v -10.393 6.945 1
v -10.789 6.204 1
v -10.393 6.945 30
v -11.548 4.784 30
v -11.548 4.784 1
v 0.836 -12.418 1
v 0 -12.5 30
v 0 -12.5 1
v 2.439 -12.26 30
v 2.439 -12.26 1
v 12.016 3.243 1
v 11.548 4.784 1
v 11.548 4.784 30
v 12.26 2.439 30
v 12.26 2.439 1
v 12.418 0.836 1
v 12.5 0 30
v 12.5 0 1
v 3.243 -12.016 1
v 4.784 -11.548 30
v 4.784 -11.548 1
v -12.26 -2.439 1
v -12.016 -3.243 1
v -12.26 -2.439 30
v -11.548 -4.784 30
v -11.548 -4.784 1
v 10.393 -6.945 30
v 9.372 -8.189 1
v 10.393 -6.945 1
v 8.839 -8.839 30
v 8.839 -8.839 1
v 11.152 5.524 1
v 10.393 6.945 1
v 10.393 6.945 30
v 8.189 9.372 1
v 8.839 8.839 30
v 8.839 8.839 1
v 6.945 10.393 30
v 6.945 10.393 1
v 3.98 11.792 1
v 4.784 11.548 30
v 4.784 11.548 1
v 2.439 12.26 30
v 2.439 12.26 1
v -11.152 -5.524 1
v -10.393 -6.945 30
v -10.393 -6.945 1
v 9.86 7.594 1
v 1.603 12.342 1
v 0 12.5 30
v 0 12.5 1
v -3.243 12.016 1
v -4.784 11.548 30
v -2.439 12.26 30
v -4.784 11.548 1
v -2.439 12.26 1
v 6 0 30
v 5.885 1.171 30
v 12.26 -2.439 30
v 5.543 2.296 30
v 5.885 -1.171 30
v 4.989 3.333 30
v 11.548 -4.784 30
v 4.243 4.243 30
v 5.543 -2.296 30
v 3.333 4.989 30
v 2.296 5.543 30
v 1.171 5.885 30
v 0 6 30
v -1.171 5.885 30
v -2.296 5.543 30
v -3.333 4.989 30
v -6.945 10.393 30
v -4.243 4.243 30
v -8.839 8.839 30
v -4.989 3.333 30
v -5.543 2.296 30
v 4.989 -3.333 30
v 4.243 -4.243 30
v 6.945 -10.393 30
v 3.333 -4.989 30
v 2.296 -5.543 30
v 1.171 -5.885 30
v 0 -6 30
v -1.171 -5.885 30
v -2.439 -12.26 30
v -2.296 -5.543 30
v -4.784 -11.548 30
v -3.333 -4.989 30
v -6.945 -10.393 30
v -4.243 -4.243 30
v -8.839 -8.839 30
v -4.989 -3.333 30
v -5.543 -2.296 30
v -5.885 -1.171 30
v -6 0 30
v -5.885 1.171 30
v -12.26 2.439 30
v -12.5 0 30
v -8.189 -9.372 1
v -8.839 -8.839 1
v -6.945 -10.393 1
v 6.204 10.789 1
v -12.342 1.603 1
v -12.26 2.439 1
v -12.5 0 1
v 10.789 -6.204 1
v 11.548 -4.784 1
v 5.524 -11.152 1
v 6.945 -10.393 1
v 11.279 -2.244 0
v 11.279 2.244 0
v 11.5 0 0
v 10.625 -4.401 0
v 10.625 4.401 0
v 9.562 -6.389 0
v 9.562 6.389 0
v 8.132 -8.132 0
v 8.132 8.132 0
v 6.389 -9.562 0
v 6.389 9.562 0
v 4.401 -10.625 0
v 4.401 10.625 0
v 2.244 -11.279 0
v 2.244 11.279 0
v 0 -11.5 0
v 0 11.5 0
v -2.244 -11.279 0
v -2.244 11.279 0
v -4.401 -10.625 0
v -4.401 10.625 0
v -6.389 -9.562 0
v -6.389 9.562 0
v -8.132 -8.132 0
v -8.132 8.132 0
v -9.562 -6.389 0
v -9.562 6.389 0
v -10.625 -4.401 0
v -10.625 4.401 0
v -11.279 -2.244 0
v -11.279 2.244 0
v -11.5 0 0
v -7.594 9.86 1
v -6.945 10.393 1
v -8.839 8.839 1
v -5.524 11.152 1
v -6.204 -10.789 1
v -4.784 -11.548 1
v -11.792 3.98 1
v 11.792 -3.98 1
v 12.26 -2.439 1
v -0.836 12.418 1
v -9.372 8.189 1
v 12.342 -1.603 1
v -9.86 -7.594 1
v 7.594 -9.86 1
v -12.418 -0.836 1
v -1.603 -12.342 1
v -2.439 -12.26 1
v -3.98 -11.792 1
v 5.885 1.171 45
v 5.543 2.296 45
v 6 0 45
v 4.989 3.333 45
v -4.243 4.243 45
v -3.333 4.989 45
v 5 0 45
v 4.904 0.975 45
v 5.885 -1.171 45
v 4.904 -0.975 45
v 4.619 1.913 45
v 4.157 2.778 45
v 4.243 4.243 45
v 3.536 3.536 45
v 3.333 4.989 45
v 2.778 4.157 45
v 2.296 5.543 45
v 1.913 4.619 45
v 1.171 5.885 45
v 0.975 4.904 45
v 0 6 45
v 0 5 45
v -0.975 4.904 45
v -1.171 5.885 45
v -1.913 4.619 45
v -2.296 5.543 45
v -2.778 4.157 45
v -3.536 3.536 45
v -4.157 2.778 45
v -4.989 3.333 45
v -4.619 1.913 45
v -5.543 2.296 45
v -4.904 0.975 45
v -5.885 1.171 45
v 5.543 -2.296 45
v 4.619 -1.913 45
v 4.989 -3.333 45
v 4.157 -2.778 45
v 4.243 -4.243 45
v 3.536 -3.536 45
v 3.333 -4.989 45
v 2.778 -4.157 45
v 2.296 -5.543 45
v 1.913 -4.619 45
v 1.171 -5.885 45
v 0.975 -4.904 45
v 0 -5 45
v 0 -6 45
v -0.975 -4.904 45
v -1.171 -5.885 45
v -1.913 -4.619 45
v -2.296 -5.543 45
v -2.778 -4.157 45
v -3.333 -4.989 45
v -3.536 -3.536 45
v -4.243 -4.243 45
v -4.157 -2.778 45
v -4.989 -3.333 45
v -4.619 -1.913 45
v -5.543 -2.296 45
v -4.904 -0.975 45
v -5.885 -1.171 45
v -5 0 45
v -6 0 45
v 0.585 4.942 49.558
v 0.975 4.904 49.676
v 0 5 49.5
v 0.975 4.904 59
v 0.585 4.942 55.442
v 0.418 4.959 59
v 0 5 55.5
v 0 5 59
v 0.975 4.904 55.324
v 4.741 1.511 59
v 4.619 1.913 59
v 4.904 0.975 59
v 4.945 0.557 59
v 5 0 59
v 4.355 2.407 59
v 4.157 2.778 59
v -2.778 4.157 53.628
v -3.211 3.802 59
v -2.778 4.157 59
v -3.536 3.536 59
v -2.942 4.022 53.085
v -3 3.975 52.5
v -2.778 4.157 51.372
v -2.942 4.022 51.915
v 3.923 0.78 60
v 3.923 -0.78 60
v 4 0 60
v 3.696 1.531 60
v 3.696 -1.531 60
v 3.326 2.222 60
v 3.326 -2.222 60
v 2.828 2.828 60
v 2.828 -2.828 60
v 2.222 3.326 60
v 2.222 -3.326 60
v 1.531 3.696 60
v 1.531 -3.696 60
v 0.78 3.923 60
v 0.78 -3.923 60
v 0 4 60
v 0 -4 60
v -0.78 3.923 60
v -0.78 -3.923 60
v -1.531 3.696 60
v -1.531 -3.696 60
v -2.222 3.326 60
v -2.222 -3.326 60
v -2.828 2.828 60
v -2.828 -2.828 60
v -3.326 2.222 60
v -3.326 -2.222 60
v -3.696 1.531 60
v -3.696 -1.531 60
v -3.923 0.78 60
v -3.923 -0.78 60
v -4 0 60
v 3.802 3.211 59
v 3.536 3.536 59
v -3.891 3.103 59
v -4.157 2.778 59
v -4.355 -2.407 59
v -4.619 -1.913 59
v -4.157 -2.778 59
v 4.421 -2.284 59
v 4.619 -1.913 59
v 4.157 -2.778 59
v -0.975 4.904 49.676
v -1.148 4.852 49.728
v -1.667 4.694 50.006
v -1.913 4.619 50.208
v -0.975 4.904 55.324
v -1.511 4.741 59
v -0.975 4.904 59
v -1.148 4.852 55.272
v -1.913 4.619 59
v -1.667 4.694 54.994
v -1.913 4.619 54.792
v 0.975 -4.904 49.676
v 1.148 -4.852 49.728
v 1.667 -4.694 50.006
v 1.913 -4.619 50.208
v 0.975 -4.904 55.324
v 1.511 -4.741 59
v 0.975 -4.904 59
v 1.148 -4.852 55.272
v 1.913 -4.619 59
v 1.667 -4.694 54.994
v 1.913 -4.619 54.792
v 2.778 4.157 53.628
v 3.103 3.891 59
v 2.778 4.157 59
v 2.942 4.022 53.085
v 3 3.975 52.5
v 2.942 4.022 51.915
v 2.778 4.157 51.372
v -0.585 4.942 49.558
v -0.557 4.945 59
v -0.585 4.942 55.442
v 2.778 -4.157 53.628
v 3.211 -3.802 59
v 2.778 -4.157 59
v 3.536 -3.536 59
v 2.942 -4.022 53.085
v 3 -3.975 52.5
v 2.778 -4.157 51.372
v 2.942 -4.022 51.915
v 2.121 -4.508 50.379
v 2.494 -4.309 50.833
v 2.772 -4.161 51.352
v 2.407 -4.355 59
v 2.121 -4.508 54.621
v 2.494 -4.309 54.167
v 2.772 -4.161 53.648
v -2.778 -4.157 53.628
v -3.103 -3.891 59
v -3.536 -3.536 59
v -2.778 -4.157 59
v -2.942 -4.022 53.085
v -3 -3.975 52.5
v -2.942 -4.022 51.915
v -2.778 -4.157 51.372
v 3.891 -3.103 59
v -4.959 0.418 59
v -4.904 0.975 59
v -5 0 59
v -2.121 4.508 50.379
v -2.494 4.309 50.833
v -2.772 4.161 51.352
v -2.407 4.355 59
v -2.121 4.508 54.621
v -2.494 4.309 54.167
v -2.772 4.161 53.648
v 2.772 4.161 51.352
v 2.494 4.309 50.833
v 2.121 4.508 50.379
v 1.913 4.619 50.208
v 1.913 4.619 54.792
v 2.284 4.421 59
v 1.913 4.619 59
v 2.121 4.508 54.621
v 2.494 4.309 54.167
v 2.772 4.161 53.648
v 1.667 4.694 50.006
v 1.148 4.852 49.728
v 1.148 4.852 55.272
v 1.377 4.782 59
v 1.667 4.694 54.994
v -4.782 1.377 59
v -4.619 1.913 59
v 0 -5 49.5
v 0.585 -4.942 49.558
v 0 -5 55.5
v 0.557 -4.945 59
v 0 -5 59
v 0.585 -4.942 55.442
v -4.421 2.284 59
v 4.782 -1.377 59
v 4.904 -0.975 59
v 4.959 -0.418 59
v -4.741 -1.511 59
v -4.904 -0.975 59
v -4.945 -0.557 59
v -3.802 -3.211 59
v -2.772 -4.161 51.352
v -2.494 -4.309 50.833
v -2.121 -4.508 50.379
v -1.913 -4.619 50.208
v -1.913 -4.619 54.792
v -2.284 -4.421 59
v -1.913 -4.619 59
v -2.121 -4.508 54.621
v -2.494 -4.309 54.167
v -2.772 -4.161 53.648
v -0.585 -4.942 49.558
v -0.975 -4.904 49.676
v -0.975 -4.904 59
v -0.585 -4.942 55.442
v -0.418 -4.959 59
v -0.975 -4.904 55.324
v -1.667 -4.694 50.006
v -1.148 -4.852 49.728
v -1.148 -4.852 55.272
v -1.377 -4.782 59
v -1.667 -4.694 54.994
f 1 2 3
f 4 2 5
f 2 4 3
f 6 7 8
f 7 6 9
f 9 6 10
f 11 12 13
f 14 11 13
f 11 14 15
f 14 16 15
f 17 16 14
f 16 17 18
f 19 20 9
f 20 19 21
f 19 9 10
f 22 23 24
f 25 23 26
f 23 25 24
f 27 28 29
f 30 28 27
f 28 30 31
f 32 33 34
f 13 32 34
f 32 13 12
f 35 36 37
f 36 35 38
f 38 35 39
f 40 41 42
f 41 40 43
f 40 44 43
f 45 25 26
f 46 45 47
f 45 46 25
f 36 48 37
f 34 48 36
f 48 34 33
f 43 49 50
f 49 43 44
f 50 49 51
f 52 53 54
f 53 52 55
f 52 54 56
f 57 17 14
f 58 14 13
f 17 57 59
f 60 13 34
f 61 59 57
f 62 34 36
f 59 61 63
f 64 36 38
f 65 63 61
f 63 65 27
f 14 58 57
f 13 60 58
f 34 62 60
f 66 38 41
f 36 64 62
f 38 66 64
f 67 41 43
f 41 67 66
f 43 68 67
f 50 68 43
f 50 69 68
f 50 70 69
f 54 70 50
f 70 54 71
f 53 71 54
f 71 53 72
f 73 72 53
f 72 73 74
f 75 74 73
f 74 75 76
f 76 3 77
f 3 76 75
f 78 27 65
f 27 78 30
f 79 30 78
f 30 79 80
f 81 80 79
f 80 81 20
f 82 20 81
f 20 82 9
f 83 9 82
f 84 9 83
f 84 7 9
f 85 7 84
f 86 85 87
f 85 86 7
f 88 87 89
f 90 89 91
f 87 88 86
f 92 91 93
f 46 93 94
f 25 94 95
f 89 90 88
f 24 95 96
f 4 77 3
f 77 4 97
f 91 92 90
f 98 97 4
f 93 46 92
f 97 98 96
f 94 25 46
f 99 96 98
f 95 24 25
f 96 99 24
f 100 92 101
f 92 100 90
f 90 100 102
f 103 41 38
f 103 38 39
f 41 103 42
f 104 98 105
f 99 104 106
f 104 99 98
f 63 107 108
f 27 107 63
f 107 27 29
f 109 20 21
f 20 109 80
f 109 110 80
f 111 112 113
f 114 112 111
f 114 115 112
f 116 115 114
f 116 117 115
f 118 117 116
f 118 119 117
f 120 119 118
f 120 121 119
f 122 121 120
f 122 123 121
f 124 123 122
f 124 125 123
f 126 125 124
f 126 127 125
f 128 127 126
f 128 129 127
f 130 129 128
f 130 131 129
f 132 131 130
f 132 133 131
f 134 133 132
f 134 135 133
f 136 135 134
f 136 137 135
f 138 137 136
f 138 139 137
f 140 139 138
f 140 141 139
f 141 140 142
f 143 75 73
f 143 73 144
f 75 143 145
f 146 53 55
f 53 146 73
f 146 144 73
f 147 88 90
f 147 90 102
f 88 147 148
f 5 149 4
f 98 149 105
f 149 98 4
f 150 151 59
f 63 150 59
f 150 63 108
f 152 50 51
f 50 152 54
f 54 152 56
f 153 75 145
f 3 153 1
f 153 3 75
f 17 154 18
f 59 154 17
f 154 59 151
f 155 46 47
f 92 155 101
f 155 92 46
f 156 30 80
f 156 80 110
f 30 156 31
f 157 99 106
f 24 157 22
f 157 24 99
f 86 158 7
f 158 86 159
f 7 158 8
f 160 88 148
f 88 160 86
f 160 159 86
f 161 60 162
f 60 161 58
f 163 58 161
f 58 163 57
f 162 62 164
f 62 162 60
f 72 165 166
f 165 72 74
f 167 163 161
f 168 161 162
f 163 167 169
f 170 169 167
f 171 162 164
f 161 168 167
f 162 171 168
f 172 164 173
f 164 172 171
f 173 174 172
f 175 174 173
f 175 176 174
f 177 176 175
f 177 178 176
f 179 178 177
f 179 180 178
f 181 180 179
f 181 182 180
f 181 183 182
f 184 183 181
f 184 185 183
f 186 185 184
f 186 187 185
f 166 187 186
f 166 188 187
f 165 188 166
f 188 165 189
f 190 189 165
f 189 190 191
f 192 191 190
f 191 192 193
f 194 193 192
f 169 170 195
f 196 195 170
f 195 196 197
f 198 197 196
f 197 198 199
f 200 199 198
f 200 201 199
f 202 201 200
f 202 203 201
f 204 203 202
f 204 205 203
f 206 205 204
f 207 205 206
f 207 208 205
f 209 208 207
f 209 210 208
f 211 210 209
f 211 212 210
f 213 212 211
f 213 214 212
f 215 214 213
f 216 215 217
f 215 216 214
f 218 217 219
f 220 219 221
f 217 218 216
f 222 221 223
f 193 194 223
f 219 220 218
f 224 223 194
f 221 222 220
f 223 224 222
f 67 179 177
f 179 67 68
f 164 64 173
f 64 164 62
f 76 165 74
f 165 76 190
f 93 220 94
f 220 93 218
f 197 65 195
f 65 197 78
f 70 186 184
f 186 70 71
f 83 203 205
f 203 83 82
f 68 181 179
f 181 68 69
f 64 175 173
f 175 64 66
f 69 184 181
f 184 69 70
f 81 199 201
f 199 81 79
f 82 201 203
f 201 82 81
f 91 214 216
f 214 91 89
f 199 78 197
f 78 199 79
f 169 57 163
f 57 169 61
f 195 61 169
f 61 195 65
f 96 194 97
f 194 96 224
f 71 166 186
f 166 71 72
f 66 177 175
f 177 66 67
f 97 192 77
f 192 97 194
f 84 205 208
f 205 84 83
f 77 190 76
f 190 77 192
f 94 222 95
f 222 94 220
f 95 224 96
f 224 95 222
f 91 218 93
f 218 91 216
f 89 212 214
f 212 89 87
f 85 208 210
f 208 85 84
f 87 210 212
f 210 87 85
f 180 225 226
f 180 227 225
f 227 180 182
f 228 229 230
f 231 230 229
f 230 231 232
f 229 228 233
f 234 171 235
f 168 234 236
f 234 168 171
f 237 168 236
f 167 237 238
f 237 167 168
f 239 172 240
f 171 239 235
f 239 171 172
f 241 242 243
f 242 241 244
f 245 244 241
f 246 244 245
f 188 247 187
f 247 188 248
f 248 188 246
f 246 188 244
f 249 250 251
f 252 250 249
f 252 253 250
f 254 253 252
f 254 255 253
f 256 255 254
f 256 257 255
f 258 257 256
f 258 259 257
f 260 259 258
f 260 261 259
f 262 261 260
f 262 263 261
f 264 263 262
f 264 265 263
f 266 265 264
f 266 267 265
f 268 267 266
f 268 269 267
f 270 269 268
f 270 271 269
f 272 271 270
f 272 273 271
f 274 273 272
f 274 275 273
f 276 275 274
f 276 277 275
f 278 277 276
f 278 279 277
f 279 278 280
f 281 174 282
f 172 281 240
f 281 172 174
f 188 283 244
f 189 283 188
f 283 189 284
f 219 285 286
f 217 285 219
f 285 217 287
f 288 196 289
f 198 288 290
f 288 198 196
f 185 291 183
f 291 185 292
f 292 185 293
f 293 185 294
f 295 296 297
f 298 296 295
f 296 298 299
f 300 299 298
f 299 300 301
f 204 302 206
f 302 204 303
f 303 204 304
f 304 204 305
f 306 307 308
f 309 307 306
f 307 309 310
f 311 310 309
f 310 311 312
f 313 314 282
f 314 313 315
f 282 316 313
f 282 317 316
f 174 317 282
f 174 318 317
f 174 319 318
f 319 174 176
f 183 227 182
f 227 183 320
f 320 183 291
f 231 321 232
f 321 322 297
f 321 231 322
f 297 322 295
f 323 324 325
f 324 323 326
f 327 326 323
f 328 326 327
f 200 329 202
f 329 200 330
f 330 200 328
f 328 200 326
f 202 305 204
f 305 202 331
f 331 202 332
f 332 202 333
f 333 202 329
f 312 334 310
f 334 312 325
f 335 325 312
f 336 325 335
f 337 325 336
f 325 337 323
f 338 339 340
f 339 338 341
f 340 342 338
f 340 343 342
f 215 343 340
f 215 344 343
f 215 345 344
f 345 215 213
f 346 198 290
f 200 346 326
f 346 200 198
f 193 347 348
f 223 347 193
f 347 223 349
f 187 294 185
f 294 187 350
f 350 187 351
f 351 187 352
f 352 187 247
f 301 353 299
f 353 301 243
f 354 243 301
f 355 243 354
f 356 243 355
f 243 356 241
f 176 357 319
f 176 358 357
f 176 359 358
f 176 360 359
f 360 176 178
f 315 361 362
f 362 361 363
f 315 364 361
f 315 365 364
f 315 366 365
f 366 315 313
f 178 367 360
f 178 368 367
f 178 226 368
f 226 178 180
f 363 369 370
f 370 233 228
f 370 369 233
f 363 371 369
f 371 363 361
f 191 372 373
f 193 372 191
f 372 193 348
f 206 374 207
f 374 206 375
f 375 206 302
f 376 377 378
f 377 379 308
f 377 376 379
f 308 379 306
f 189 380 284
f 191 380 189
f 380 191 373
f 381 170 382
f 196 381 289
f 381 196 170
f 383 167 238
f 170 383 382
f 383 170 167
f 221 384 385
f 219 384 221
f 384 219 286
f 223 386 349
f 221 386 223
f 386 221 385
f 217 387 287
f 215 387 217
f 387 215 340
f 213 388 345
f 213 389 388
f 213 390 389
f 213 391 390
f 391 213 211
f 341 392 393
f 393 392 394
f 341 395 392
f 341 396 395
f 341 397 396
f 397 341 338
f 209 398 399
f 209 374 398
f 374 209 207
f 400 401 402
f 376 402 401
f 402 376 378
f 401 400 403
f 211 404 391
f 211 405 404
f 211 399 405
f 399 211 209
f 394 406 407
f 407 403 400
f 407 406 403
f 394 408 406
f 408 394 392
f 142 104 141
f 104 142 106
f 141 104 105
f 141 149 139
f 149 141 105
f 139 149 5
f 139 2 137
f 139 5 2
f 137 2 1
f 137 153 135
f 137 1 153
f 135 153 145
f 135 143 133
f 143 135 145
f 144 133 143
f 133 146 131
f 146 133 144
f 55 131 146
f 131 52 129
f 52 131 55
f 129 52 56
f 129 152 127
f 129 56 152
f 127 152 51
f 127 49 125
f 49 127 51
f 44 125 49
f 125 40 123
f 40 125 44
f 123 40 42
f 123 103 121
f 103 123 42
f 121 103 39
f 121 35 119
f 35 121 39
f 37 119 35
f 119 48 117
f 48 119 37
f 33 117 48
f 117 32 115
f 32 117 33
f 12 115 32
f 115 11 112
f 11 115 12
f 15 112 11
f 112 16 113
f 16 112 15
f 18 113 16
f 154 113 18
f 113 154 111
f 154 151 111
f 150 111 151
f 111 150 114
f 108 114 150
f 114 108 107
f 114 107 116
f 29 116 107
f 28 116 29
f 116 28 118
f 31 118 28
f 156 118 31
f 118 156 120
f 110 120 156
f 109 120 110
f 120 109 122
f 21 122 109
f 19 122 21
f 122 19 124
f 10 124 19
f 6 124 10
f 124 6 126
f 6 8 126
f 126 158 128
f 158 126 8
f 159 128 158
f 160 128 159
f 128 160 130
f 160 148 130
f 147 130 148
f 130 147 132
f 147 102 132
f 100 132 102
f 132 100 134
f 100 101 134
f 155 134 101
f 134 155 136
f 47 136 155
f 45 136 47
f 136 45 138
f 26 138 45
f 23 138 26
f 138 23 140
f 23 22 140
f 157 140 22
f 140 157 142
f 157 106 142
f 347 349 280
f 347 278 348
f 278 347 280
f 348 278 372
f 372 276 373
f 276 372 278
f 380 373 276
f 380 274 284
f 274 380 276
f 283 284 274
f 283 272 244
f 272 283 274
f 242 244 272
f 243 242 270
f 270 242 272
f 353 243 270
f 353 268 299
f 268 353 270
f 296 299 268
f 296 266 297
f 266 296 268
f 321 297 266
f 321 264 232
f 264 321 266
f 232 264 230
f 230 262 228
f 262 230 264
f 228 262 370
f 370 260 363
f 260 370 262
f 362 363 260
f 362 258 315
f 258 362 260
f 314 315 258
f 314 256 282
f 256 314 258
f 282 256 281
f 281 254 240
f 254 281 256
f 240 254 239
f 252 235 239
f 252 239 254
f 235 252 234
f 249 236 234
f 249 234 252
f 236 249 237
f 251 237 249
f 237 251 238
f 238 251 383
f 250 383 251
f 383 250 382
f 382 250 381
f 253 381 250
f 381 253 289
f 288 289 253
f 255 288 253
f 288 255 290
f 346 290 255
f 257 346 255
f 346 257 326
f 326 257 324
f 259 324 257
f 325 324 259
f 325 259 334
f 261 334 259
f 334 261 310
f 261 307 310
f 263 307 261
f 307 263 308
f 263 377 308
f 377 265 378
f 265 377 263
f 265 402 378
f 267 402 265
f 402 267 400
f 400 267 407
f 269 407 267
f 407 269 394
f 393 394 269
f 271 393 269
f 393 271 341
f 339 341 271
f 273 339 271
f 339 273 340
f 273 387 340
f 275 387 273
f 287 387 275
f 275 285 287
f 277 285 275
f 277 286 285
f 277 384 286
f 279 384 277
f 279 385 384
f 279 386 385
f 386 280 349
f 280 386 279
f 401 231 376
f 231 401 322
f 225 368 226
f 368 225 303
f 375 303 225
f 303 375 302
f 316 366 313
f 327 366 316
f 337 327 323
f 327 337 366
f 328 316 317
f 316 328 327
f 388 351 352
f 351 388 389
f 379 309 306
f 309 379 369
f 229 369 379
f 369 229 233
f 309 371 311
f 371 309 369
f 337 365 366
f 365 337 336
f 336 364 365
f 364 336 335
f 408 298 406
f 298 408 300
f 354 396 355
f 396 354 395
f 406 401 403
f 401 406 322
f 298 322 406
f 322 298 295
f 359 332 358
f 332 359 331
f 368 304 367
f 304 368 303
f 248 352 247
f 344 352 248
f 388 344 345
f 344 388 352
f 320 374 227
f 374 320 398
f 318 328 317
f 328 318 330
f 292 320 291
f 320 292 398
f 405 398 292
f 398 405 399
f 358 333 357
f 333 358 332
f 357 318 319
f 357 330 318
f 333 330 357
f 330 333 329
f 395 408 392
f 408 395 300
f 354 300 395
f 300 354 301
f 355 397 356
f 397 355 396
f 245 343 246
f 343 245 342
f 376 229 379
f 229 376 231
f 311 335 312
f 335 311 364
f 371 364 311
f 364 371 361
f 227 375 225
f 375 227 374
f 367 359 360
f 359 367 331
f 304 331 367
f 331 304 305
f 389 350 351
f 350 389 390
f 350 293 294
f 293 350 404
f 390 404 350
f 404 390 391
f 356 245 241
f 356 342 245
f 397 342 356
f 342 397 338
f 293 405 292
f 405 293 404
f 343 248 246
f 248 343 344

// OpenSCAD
$fn = 32;

// ----------------------------------------------------------------------
// Stepped shaft: diameters 25, 12, 10 mm, 60 mm long
// ----------------------------------------------------------------------

// --- parameters (mm) ---
d1 = 25;                  // step 1 diameter
len1 = 30;                // step 1 length
d2 = 12;                  // step 2 diameter
len2 = 15;                // step 2 length
d3 = 10;                  // step 3 diameter
len3 = 15;                // step 3 length
total = 60;               // overall length
chamfer = 1;              // end chamfer
cross_d = 6;              // cross pin hole
cross_z = 52.5;           // cross hole position

difference() {
  /* turned body: stacked cylinders, every step sunk into the bigger one */
  union() {
    cylinder(h = len1, d = d1);
    translate([0, 0, 29.6]) cylinder(h = 15.4, d = d2);
    translate([0, 0, 44.6]) cylinder(h = 15.4, d = d3);
  }
  /* bottom chamfer ring cut */
  rotate_extrude() translate([11.5, -2.5]) polygon([[0, 0], [3.5, 0], [3.5, 6], [0, 2.5]]);
  /* top chamfer ring cut */
  rotate_extrude() translate([4, 60]) polygon([[0, 0], [3.5, -3.5], [3.5, 2.5], [0, 2.5]]);
  /* cross pin hole through the small step */
  translate([0, 0, cross_z]) rotate([90, 0, 0]) cylinder(h = d3 + 5, d = cross_d, center = true);
}
